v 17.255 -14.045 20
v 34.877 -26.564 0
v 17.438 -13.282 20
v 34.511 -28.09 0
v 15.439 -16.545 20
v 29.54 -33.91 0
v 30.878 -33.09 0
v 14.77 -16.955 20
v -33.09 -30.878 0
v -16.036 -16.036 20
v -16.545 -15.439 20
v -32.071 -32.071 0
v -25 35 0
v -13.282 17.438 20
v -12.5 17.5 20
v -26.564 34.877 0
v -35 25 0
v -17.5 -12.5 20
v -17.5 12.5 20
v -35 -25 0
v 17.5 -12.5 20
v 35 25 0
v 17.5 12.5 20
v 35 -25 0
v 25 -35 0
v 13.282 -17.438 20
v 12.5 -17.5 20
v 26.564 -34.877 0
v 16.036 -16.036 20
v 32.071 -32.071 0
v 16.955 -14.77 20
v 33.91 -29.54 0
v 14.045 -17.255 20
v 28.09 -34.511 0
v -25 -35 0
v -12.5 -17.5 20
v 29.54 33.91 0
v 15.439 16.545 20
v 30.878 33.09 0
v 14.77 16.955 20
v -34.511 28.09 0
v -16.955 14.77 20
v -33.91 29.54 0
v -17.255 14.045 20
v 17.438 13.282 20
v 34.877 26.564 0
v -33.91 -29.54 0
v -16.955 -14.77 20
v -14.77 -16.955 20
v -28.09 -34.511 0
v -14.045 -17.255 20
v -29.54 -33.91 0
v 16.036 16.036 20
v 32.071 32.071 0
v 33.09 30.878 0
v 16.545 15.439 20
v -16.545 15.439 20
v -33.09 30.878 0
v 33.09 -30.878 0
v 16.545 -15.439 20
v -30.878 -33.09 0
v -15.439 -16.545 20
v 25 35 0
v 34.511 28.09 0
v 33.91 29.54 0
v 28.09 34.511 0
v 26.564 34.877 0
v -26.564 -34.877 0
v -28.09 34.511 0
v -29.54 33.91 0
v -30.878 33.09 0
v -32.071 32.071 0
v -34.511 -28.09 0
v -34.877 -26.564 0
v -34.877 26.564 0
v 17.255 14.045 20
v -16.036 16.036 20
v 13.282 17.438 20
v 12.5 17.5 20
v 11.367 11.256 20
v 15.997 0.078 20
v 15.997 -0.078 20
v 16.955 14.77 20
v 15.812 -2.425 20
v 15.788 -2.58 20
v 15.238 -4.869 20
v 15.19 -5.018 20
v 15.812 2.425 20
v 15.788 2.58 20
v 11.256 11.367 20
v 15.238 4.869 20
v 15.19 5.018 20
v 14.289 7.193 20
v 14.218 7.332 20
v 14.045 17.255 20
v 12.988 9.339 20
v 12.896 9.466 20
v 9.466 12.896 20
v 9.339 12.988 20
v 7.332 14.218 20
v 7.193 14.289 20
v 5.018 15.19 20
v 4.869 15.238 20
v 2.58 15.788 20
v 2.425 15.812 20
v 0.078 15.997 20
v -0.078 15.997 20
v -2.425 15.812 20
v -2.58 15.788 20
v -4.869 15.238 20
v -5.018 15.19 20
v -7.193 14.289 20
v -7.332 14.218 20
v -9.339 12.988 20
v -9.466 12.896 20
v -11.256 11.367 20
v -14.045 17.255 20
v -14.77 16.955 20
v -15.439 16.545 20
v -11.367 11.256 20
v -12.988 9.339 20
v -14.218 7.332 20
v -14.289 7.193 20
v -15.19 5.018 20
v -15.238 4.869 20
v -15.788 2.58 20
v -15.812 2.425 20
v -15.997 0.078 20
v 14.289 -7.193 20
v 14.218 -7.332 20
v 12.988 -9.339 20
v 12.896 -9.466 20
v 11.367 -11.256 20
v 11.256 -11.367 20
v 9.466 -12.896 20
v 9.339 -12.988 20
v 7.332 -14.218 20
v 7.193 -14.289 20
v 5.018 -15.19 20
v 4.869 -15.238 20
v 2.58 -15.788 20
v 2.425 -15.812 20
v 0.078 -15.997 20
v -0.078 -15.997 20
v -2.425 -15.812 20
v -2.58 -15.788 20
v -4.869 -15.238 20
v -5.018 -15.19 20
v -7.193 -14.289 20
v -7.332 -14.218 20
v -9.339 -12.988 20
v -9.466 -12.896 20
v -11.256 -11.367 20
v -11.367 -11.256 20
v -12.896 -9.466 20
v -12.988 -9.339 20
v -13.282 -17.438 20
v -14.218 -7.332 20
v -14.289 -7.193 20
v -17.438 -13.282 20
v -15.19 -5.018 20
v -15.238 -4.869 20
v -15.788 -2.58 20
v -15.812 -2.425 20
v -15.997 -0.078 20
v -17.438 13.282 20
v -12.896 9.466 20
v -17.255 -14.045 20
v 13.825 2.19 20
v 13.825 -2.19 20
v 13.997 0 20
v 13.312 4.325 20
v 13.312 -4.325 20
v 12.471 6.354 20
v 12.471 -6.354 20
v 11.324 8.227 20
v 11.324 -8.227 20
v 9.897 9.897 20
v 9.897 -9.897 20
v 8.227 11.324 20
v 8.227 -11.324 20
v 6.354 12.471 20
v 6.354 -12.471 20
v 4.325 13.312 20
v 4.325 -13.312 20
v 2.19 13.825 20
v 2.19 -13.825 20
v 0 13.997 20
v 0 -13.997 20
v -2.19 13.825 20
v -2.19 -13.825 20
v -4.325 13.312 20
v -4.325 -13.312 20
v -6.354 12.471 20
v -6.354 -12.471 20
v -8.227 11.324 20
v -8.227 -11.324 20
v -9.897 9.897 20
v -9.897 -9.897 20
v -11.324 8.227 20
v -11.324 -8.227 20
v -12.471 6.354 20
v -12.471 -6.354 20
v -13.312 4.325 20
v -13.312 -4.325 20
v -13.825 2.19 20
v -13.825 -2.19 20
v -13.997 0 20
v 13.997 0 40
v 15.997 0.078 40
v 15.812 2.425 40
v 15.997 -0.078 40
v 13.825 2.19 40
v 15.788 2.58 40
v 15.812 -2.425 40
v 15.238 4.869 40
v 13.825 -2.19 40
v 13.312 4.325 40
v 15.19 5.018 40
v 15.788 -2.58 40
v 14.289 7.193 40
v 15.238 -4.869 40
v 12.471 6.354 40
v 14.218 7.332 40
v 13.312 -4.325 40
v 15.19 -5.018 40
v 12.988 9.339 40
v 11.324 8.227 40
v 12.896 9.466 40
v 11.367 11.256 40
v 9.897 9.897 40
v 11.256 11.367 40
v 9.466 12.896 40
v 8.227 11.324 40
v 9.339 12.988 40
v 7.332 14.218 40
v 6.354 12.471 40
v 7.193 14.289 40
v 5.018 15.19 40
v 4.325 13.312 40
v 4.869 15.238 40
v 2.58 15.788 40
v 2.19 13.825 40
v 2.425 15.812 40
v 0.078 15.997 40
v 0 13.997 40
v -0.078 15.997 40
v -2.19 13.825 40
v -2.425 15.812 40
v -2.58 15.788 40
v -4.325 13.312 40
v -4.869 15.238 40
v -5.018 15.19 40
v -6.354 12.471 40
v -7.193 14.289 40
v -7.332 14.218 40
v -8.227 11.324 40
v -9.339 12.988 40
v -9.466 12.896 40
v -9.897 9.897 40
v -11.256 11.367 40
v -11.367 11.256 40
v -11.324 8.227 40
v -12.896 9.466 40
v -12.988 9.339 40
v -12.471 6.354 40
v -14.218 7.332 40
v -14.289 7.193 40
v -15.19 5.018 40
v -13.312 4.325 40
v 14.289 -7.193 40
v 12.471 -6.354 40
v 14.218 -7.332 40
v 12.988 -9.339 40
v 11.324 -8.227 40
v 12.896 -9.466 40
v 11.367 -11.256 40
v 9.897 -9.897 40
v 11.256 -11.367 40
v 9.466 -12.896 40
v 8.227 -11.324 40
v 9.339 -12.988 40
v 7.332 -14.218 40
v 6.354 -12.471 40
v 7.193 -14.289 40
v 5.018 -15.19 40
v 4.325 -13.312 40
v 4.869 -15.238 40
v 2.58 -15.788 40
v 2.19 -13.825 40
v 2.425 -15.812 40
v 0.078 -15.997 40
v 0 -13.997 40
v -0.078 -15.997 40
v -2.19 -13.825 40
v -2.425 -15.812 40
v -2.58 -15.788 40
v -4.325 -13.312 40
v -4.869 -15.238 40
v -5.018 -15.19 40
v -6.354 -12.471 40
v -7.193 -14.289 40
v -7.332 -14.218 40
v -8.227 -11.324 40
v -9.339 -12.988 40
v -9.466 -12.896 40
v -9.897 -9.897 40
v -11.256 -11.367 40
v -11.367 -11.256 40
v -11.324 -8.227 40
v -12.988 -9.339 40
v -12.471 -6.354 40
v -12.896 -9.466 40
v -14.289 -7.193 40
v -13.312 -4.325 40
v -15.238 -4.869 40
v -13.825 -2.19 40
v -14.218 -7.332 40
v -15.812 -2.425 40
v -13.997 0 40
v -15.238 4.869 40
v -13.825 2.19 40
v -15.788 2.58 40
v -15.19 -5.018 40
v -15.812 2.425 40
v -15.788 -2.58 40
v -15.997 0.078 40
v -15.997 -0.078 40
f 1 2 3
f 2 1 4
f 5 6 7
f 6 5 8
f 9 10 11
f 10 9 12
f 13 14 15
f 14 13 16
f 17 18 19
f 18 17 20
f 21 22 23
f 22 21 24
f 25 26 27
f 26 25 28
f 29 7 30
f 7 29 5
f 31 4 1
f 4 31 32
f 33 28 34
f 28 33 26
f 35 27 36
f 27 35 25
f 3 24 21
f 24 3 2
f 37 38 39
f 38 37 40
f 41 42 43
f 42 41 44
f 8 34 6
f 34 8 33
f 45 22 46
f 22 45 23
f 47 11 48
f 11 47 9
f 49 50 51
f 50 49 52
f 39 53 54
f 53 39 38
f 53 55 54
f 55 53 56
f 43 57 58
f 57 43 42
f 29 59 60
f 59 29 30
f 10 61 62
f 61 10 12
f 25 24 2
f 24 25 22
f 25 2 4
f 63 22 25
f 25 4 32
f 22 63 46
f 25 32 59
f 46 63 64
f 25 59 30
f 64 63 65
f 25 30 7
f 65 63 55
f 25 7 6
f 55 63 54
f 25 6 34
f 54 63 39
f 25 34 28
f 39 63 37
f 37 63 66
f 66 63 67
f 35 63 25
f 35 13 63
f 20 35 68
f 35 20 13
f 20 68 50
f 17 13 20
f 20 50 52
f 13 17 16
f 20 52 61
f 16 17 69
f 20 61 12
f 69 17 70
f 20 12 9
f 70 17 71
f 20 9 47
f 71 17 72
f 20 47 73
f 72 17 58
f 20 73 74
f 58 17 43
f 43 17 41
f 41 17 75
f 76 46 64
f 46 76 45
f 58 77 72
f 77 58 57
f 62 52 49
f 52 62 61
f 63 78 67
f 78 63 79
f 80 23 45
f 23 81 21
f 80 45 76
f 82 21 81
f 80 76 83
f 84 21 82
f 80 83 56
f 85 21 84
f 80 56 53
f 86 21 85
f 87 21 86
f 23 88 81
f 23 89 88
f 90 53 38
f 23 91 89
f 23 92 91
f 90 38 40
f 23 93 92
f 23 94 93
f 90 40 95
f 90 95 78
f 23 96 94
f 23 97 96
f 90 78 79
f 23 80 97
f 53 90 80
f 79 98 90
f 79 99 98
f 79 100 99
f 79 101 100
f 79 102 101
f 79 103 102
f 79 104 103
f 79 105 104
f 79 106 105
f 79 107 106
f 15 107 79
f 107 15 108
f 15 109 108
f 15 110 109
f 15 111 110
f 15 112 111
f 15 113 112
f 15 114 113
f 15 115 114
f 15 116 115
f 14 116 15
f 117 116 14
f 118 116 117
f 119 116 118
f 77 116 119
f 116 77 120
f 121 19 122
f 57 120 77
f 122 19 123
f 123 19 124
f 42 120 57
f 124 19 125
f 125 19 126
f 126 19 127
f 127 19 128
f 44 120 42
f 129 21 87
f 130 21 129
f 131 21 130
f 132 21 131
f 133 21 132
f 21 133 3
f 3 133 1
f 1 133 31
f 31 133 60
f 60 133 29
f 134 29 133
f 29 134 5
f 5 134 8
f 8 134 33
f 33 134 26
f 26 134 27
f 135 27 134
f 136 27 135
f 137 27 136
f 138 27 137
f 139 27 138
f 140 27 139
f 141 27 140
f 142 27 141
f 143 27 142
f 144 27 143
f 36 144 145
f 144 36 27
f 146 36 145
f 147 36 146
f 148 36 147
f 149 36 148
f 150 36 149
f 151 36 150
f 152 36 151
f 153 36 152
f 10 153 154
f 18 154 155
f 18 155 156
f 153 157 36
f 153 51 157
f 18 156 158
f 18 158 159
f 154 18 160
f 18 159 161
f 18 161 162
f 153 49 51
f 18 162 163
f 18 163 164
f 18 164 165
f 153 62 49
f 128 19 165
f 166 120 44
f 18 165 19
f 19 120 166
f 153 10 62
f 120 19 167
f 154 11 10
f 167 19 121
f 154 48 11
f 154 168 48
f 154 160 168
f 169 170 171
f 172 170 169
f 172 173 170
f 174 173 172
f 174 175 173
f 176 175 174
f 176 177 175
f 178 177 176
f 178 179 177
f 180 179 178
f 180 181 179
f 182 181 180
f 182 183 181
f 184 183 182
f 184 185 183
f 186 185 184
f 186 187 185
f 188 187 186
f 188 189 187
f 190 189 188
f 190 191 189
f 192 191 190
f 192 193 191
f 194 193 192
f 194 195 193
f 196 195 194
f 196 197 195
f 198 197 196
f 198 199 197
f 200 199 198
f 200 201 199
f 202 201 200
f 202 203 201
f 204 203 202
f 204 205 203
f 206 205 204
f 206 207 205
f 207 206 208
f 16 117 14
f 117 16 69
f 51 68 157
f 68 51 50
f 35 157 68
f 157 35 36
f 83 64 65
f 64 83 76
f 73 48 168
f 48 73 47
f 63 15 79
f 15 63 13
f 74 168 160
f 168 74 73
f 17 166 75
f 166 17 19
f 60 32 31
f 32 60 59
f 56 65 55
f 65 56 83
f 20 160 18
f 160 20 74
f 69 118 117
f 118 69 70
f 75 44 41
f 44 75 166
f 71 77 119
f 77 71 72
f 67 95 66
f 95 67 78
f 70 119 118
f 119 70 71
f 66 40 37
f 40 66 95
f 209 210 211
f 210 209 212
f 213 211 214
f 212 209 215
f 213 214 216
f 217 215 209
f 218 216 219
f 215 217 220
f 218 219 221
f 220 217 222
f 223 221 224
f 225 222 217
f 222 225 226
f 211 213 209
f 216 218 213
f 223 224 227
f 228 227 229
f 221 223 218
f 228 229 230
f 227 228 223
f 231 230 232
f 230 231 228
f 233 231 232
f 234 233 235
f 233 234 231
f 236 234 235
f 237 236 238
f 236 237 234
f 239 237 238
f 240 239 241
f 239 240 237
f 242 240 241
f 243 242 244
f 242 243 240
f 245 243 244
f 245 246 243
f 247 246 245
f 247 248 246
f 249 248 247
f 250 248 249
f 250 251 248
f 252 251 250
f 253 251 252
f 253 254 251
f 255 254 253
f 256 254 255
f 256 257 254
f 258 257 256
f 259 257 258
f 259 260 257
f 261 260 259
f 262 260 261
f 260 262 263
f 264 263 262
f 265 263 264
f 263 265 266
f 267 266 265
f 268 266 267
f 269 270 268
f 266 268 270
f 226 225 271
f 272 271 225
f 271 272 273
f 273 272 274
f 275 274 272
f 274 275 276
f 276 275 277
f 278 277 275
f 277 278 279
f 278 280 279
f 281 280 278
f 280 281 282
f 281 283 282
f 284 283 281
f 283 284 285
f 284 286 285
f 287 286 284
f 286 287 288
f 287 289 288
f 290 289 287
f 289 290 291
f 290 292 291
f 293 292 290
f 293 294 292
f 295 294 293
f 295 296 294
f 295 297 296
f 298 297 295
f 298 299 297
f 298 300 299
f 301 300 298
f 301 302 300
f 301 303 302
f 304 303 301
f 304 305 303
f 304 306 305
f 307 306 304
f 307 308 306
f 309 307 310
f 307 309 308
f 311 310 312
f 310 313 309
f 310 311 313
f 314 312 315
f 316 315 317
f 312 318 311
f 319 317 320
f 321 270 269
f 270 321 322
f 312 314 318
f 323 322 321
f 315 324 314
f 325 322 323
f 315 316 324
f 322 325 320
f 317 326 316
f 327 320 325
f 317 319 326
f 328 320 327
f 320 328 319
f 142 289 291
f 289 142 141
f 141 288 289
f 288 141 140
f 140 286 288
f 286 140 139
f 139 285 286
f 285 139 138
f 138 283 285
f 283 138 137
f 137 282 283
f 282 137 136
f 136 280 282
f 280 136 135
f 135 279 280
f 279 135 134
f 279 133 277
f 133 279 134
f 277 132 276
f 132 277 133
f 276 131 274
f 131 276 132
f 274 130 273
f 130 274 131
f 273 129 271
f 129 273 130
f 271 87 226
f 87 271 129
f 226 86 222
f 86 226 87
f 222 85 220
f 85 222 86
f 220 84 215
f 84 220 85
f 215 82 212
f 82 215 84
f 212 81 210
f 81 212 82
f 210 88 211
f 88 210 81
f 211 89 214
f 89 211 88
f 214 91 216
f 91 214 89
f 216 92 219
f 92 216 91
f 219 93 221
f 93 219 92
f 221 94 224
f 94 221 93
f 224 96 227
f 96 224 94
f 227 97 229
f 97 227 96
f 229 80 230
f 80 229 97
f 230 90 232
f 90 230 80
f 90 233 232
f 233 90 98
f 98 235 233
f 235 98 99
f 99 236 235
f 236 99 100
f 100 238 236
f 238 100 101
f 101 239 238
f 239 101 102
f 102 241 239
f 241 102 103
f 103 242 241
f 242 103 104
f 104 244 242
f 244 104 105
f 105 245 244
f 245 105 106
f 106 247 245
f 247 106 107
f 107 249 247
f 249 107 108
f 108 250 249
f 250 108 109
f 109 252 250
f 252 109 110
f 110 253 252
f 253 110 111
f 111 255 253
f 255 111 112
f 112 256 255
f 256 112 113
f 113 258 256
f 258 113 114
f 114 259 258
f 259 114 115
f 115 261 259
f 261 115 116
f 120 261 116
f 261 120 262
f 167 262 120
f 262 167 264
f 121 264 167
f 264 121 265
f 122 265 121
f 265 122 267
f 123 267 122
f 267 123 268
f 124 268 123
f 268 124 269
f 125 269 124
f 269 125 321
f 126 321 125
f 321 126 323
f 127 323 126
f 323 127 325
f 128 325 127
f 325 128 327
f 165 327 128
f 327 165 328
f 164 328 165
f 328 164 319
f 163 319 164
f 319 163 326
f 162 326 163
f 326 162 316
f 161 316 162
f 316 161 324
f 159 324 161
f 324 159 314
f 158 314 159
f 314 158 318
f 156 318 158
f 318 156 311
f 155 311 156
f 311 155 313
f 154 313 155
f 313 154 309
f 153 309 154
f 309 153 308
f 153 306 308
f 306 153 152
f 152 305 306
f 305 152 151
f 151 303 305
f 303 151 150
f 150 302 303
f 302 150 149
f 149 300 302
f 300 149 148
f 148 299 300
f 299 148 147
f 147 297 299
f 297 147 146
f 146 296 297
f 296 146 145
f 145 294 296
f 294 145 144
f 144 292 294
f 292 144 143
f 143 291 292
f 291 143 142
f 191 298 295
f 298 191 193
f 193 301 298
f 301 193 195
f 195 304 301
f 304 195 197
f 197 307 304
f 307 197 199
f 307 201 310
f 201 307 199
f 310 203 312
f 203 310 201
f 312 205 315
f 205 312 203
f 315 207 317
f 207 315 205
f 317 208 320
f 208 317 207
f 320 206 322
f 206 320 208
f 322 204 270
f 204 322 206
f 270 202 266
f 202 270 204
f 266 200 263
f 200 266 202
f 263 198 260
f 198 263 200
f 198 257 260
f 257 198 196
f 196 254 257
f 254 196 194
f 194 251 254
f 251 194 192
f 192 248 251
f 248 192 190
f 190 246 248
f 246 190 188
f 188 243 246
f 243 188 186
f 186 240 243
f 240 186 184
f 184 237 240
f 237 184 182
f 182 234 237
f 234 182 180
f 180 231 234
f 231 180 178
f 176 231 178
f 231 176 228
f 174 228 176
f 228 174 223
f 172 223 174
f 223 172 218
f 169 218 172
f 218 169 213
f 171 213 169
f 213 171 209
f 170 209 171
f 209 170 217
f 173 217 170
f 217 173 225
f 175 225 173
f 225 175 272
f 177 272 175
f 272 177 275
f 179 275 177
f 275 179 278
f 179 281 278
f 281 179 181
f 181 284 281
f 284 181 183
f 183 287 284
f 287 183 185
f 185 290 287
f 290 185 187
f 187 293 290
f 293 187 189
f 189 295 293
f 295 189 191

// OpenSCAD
// Example for offset() usage
// (c) 2014 Torsten Paul
// CC-BY-SA 4.0

$fn = 40;

foot_height = 20;

module outline(wall = 1) {
	difference() {
		offset(wall / 2) children();
		offset(-wall / 2) children();
	}
}

// offsetting with a positive value and join_type = "round"
// allows to create rounded corners easily
linear_extrude(height = foot_height, scale = 0.5) {
  offset(10, join_type = "round") {
    square(50, center = true);
  }
}

translate([0, 0, foot_height]) {
	linear_extrude(height = 20) {
		outline(wall = 2) circle(15);
	}
}

%cylinder(r = 14, h = 100);
%translate([0, 0, 100]) sphere(r = 30);
